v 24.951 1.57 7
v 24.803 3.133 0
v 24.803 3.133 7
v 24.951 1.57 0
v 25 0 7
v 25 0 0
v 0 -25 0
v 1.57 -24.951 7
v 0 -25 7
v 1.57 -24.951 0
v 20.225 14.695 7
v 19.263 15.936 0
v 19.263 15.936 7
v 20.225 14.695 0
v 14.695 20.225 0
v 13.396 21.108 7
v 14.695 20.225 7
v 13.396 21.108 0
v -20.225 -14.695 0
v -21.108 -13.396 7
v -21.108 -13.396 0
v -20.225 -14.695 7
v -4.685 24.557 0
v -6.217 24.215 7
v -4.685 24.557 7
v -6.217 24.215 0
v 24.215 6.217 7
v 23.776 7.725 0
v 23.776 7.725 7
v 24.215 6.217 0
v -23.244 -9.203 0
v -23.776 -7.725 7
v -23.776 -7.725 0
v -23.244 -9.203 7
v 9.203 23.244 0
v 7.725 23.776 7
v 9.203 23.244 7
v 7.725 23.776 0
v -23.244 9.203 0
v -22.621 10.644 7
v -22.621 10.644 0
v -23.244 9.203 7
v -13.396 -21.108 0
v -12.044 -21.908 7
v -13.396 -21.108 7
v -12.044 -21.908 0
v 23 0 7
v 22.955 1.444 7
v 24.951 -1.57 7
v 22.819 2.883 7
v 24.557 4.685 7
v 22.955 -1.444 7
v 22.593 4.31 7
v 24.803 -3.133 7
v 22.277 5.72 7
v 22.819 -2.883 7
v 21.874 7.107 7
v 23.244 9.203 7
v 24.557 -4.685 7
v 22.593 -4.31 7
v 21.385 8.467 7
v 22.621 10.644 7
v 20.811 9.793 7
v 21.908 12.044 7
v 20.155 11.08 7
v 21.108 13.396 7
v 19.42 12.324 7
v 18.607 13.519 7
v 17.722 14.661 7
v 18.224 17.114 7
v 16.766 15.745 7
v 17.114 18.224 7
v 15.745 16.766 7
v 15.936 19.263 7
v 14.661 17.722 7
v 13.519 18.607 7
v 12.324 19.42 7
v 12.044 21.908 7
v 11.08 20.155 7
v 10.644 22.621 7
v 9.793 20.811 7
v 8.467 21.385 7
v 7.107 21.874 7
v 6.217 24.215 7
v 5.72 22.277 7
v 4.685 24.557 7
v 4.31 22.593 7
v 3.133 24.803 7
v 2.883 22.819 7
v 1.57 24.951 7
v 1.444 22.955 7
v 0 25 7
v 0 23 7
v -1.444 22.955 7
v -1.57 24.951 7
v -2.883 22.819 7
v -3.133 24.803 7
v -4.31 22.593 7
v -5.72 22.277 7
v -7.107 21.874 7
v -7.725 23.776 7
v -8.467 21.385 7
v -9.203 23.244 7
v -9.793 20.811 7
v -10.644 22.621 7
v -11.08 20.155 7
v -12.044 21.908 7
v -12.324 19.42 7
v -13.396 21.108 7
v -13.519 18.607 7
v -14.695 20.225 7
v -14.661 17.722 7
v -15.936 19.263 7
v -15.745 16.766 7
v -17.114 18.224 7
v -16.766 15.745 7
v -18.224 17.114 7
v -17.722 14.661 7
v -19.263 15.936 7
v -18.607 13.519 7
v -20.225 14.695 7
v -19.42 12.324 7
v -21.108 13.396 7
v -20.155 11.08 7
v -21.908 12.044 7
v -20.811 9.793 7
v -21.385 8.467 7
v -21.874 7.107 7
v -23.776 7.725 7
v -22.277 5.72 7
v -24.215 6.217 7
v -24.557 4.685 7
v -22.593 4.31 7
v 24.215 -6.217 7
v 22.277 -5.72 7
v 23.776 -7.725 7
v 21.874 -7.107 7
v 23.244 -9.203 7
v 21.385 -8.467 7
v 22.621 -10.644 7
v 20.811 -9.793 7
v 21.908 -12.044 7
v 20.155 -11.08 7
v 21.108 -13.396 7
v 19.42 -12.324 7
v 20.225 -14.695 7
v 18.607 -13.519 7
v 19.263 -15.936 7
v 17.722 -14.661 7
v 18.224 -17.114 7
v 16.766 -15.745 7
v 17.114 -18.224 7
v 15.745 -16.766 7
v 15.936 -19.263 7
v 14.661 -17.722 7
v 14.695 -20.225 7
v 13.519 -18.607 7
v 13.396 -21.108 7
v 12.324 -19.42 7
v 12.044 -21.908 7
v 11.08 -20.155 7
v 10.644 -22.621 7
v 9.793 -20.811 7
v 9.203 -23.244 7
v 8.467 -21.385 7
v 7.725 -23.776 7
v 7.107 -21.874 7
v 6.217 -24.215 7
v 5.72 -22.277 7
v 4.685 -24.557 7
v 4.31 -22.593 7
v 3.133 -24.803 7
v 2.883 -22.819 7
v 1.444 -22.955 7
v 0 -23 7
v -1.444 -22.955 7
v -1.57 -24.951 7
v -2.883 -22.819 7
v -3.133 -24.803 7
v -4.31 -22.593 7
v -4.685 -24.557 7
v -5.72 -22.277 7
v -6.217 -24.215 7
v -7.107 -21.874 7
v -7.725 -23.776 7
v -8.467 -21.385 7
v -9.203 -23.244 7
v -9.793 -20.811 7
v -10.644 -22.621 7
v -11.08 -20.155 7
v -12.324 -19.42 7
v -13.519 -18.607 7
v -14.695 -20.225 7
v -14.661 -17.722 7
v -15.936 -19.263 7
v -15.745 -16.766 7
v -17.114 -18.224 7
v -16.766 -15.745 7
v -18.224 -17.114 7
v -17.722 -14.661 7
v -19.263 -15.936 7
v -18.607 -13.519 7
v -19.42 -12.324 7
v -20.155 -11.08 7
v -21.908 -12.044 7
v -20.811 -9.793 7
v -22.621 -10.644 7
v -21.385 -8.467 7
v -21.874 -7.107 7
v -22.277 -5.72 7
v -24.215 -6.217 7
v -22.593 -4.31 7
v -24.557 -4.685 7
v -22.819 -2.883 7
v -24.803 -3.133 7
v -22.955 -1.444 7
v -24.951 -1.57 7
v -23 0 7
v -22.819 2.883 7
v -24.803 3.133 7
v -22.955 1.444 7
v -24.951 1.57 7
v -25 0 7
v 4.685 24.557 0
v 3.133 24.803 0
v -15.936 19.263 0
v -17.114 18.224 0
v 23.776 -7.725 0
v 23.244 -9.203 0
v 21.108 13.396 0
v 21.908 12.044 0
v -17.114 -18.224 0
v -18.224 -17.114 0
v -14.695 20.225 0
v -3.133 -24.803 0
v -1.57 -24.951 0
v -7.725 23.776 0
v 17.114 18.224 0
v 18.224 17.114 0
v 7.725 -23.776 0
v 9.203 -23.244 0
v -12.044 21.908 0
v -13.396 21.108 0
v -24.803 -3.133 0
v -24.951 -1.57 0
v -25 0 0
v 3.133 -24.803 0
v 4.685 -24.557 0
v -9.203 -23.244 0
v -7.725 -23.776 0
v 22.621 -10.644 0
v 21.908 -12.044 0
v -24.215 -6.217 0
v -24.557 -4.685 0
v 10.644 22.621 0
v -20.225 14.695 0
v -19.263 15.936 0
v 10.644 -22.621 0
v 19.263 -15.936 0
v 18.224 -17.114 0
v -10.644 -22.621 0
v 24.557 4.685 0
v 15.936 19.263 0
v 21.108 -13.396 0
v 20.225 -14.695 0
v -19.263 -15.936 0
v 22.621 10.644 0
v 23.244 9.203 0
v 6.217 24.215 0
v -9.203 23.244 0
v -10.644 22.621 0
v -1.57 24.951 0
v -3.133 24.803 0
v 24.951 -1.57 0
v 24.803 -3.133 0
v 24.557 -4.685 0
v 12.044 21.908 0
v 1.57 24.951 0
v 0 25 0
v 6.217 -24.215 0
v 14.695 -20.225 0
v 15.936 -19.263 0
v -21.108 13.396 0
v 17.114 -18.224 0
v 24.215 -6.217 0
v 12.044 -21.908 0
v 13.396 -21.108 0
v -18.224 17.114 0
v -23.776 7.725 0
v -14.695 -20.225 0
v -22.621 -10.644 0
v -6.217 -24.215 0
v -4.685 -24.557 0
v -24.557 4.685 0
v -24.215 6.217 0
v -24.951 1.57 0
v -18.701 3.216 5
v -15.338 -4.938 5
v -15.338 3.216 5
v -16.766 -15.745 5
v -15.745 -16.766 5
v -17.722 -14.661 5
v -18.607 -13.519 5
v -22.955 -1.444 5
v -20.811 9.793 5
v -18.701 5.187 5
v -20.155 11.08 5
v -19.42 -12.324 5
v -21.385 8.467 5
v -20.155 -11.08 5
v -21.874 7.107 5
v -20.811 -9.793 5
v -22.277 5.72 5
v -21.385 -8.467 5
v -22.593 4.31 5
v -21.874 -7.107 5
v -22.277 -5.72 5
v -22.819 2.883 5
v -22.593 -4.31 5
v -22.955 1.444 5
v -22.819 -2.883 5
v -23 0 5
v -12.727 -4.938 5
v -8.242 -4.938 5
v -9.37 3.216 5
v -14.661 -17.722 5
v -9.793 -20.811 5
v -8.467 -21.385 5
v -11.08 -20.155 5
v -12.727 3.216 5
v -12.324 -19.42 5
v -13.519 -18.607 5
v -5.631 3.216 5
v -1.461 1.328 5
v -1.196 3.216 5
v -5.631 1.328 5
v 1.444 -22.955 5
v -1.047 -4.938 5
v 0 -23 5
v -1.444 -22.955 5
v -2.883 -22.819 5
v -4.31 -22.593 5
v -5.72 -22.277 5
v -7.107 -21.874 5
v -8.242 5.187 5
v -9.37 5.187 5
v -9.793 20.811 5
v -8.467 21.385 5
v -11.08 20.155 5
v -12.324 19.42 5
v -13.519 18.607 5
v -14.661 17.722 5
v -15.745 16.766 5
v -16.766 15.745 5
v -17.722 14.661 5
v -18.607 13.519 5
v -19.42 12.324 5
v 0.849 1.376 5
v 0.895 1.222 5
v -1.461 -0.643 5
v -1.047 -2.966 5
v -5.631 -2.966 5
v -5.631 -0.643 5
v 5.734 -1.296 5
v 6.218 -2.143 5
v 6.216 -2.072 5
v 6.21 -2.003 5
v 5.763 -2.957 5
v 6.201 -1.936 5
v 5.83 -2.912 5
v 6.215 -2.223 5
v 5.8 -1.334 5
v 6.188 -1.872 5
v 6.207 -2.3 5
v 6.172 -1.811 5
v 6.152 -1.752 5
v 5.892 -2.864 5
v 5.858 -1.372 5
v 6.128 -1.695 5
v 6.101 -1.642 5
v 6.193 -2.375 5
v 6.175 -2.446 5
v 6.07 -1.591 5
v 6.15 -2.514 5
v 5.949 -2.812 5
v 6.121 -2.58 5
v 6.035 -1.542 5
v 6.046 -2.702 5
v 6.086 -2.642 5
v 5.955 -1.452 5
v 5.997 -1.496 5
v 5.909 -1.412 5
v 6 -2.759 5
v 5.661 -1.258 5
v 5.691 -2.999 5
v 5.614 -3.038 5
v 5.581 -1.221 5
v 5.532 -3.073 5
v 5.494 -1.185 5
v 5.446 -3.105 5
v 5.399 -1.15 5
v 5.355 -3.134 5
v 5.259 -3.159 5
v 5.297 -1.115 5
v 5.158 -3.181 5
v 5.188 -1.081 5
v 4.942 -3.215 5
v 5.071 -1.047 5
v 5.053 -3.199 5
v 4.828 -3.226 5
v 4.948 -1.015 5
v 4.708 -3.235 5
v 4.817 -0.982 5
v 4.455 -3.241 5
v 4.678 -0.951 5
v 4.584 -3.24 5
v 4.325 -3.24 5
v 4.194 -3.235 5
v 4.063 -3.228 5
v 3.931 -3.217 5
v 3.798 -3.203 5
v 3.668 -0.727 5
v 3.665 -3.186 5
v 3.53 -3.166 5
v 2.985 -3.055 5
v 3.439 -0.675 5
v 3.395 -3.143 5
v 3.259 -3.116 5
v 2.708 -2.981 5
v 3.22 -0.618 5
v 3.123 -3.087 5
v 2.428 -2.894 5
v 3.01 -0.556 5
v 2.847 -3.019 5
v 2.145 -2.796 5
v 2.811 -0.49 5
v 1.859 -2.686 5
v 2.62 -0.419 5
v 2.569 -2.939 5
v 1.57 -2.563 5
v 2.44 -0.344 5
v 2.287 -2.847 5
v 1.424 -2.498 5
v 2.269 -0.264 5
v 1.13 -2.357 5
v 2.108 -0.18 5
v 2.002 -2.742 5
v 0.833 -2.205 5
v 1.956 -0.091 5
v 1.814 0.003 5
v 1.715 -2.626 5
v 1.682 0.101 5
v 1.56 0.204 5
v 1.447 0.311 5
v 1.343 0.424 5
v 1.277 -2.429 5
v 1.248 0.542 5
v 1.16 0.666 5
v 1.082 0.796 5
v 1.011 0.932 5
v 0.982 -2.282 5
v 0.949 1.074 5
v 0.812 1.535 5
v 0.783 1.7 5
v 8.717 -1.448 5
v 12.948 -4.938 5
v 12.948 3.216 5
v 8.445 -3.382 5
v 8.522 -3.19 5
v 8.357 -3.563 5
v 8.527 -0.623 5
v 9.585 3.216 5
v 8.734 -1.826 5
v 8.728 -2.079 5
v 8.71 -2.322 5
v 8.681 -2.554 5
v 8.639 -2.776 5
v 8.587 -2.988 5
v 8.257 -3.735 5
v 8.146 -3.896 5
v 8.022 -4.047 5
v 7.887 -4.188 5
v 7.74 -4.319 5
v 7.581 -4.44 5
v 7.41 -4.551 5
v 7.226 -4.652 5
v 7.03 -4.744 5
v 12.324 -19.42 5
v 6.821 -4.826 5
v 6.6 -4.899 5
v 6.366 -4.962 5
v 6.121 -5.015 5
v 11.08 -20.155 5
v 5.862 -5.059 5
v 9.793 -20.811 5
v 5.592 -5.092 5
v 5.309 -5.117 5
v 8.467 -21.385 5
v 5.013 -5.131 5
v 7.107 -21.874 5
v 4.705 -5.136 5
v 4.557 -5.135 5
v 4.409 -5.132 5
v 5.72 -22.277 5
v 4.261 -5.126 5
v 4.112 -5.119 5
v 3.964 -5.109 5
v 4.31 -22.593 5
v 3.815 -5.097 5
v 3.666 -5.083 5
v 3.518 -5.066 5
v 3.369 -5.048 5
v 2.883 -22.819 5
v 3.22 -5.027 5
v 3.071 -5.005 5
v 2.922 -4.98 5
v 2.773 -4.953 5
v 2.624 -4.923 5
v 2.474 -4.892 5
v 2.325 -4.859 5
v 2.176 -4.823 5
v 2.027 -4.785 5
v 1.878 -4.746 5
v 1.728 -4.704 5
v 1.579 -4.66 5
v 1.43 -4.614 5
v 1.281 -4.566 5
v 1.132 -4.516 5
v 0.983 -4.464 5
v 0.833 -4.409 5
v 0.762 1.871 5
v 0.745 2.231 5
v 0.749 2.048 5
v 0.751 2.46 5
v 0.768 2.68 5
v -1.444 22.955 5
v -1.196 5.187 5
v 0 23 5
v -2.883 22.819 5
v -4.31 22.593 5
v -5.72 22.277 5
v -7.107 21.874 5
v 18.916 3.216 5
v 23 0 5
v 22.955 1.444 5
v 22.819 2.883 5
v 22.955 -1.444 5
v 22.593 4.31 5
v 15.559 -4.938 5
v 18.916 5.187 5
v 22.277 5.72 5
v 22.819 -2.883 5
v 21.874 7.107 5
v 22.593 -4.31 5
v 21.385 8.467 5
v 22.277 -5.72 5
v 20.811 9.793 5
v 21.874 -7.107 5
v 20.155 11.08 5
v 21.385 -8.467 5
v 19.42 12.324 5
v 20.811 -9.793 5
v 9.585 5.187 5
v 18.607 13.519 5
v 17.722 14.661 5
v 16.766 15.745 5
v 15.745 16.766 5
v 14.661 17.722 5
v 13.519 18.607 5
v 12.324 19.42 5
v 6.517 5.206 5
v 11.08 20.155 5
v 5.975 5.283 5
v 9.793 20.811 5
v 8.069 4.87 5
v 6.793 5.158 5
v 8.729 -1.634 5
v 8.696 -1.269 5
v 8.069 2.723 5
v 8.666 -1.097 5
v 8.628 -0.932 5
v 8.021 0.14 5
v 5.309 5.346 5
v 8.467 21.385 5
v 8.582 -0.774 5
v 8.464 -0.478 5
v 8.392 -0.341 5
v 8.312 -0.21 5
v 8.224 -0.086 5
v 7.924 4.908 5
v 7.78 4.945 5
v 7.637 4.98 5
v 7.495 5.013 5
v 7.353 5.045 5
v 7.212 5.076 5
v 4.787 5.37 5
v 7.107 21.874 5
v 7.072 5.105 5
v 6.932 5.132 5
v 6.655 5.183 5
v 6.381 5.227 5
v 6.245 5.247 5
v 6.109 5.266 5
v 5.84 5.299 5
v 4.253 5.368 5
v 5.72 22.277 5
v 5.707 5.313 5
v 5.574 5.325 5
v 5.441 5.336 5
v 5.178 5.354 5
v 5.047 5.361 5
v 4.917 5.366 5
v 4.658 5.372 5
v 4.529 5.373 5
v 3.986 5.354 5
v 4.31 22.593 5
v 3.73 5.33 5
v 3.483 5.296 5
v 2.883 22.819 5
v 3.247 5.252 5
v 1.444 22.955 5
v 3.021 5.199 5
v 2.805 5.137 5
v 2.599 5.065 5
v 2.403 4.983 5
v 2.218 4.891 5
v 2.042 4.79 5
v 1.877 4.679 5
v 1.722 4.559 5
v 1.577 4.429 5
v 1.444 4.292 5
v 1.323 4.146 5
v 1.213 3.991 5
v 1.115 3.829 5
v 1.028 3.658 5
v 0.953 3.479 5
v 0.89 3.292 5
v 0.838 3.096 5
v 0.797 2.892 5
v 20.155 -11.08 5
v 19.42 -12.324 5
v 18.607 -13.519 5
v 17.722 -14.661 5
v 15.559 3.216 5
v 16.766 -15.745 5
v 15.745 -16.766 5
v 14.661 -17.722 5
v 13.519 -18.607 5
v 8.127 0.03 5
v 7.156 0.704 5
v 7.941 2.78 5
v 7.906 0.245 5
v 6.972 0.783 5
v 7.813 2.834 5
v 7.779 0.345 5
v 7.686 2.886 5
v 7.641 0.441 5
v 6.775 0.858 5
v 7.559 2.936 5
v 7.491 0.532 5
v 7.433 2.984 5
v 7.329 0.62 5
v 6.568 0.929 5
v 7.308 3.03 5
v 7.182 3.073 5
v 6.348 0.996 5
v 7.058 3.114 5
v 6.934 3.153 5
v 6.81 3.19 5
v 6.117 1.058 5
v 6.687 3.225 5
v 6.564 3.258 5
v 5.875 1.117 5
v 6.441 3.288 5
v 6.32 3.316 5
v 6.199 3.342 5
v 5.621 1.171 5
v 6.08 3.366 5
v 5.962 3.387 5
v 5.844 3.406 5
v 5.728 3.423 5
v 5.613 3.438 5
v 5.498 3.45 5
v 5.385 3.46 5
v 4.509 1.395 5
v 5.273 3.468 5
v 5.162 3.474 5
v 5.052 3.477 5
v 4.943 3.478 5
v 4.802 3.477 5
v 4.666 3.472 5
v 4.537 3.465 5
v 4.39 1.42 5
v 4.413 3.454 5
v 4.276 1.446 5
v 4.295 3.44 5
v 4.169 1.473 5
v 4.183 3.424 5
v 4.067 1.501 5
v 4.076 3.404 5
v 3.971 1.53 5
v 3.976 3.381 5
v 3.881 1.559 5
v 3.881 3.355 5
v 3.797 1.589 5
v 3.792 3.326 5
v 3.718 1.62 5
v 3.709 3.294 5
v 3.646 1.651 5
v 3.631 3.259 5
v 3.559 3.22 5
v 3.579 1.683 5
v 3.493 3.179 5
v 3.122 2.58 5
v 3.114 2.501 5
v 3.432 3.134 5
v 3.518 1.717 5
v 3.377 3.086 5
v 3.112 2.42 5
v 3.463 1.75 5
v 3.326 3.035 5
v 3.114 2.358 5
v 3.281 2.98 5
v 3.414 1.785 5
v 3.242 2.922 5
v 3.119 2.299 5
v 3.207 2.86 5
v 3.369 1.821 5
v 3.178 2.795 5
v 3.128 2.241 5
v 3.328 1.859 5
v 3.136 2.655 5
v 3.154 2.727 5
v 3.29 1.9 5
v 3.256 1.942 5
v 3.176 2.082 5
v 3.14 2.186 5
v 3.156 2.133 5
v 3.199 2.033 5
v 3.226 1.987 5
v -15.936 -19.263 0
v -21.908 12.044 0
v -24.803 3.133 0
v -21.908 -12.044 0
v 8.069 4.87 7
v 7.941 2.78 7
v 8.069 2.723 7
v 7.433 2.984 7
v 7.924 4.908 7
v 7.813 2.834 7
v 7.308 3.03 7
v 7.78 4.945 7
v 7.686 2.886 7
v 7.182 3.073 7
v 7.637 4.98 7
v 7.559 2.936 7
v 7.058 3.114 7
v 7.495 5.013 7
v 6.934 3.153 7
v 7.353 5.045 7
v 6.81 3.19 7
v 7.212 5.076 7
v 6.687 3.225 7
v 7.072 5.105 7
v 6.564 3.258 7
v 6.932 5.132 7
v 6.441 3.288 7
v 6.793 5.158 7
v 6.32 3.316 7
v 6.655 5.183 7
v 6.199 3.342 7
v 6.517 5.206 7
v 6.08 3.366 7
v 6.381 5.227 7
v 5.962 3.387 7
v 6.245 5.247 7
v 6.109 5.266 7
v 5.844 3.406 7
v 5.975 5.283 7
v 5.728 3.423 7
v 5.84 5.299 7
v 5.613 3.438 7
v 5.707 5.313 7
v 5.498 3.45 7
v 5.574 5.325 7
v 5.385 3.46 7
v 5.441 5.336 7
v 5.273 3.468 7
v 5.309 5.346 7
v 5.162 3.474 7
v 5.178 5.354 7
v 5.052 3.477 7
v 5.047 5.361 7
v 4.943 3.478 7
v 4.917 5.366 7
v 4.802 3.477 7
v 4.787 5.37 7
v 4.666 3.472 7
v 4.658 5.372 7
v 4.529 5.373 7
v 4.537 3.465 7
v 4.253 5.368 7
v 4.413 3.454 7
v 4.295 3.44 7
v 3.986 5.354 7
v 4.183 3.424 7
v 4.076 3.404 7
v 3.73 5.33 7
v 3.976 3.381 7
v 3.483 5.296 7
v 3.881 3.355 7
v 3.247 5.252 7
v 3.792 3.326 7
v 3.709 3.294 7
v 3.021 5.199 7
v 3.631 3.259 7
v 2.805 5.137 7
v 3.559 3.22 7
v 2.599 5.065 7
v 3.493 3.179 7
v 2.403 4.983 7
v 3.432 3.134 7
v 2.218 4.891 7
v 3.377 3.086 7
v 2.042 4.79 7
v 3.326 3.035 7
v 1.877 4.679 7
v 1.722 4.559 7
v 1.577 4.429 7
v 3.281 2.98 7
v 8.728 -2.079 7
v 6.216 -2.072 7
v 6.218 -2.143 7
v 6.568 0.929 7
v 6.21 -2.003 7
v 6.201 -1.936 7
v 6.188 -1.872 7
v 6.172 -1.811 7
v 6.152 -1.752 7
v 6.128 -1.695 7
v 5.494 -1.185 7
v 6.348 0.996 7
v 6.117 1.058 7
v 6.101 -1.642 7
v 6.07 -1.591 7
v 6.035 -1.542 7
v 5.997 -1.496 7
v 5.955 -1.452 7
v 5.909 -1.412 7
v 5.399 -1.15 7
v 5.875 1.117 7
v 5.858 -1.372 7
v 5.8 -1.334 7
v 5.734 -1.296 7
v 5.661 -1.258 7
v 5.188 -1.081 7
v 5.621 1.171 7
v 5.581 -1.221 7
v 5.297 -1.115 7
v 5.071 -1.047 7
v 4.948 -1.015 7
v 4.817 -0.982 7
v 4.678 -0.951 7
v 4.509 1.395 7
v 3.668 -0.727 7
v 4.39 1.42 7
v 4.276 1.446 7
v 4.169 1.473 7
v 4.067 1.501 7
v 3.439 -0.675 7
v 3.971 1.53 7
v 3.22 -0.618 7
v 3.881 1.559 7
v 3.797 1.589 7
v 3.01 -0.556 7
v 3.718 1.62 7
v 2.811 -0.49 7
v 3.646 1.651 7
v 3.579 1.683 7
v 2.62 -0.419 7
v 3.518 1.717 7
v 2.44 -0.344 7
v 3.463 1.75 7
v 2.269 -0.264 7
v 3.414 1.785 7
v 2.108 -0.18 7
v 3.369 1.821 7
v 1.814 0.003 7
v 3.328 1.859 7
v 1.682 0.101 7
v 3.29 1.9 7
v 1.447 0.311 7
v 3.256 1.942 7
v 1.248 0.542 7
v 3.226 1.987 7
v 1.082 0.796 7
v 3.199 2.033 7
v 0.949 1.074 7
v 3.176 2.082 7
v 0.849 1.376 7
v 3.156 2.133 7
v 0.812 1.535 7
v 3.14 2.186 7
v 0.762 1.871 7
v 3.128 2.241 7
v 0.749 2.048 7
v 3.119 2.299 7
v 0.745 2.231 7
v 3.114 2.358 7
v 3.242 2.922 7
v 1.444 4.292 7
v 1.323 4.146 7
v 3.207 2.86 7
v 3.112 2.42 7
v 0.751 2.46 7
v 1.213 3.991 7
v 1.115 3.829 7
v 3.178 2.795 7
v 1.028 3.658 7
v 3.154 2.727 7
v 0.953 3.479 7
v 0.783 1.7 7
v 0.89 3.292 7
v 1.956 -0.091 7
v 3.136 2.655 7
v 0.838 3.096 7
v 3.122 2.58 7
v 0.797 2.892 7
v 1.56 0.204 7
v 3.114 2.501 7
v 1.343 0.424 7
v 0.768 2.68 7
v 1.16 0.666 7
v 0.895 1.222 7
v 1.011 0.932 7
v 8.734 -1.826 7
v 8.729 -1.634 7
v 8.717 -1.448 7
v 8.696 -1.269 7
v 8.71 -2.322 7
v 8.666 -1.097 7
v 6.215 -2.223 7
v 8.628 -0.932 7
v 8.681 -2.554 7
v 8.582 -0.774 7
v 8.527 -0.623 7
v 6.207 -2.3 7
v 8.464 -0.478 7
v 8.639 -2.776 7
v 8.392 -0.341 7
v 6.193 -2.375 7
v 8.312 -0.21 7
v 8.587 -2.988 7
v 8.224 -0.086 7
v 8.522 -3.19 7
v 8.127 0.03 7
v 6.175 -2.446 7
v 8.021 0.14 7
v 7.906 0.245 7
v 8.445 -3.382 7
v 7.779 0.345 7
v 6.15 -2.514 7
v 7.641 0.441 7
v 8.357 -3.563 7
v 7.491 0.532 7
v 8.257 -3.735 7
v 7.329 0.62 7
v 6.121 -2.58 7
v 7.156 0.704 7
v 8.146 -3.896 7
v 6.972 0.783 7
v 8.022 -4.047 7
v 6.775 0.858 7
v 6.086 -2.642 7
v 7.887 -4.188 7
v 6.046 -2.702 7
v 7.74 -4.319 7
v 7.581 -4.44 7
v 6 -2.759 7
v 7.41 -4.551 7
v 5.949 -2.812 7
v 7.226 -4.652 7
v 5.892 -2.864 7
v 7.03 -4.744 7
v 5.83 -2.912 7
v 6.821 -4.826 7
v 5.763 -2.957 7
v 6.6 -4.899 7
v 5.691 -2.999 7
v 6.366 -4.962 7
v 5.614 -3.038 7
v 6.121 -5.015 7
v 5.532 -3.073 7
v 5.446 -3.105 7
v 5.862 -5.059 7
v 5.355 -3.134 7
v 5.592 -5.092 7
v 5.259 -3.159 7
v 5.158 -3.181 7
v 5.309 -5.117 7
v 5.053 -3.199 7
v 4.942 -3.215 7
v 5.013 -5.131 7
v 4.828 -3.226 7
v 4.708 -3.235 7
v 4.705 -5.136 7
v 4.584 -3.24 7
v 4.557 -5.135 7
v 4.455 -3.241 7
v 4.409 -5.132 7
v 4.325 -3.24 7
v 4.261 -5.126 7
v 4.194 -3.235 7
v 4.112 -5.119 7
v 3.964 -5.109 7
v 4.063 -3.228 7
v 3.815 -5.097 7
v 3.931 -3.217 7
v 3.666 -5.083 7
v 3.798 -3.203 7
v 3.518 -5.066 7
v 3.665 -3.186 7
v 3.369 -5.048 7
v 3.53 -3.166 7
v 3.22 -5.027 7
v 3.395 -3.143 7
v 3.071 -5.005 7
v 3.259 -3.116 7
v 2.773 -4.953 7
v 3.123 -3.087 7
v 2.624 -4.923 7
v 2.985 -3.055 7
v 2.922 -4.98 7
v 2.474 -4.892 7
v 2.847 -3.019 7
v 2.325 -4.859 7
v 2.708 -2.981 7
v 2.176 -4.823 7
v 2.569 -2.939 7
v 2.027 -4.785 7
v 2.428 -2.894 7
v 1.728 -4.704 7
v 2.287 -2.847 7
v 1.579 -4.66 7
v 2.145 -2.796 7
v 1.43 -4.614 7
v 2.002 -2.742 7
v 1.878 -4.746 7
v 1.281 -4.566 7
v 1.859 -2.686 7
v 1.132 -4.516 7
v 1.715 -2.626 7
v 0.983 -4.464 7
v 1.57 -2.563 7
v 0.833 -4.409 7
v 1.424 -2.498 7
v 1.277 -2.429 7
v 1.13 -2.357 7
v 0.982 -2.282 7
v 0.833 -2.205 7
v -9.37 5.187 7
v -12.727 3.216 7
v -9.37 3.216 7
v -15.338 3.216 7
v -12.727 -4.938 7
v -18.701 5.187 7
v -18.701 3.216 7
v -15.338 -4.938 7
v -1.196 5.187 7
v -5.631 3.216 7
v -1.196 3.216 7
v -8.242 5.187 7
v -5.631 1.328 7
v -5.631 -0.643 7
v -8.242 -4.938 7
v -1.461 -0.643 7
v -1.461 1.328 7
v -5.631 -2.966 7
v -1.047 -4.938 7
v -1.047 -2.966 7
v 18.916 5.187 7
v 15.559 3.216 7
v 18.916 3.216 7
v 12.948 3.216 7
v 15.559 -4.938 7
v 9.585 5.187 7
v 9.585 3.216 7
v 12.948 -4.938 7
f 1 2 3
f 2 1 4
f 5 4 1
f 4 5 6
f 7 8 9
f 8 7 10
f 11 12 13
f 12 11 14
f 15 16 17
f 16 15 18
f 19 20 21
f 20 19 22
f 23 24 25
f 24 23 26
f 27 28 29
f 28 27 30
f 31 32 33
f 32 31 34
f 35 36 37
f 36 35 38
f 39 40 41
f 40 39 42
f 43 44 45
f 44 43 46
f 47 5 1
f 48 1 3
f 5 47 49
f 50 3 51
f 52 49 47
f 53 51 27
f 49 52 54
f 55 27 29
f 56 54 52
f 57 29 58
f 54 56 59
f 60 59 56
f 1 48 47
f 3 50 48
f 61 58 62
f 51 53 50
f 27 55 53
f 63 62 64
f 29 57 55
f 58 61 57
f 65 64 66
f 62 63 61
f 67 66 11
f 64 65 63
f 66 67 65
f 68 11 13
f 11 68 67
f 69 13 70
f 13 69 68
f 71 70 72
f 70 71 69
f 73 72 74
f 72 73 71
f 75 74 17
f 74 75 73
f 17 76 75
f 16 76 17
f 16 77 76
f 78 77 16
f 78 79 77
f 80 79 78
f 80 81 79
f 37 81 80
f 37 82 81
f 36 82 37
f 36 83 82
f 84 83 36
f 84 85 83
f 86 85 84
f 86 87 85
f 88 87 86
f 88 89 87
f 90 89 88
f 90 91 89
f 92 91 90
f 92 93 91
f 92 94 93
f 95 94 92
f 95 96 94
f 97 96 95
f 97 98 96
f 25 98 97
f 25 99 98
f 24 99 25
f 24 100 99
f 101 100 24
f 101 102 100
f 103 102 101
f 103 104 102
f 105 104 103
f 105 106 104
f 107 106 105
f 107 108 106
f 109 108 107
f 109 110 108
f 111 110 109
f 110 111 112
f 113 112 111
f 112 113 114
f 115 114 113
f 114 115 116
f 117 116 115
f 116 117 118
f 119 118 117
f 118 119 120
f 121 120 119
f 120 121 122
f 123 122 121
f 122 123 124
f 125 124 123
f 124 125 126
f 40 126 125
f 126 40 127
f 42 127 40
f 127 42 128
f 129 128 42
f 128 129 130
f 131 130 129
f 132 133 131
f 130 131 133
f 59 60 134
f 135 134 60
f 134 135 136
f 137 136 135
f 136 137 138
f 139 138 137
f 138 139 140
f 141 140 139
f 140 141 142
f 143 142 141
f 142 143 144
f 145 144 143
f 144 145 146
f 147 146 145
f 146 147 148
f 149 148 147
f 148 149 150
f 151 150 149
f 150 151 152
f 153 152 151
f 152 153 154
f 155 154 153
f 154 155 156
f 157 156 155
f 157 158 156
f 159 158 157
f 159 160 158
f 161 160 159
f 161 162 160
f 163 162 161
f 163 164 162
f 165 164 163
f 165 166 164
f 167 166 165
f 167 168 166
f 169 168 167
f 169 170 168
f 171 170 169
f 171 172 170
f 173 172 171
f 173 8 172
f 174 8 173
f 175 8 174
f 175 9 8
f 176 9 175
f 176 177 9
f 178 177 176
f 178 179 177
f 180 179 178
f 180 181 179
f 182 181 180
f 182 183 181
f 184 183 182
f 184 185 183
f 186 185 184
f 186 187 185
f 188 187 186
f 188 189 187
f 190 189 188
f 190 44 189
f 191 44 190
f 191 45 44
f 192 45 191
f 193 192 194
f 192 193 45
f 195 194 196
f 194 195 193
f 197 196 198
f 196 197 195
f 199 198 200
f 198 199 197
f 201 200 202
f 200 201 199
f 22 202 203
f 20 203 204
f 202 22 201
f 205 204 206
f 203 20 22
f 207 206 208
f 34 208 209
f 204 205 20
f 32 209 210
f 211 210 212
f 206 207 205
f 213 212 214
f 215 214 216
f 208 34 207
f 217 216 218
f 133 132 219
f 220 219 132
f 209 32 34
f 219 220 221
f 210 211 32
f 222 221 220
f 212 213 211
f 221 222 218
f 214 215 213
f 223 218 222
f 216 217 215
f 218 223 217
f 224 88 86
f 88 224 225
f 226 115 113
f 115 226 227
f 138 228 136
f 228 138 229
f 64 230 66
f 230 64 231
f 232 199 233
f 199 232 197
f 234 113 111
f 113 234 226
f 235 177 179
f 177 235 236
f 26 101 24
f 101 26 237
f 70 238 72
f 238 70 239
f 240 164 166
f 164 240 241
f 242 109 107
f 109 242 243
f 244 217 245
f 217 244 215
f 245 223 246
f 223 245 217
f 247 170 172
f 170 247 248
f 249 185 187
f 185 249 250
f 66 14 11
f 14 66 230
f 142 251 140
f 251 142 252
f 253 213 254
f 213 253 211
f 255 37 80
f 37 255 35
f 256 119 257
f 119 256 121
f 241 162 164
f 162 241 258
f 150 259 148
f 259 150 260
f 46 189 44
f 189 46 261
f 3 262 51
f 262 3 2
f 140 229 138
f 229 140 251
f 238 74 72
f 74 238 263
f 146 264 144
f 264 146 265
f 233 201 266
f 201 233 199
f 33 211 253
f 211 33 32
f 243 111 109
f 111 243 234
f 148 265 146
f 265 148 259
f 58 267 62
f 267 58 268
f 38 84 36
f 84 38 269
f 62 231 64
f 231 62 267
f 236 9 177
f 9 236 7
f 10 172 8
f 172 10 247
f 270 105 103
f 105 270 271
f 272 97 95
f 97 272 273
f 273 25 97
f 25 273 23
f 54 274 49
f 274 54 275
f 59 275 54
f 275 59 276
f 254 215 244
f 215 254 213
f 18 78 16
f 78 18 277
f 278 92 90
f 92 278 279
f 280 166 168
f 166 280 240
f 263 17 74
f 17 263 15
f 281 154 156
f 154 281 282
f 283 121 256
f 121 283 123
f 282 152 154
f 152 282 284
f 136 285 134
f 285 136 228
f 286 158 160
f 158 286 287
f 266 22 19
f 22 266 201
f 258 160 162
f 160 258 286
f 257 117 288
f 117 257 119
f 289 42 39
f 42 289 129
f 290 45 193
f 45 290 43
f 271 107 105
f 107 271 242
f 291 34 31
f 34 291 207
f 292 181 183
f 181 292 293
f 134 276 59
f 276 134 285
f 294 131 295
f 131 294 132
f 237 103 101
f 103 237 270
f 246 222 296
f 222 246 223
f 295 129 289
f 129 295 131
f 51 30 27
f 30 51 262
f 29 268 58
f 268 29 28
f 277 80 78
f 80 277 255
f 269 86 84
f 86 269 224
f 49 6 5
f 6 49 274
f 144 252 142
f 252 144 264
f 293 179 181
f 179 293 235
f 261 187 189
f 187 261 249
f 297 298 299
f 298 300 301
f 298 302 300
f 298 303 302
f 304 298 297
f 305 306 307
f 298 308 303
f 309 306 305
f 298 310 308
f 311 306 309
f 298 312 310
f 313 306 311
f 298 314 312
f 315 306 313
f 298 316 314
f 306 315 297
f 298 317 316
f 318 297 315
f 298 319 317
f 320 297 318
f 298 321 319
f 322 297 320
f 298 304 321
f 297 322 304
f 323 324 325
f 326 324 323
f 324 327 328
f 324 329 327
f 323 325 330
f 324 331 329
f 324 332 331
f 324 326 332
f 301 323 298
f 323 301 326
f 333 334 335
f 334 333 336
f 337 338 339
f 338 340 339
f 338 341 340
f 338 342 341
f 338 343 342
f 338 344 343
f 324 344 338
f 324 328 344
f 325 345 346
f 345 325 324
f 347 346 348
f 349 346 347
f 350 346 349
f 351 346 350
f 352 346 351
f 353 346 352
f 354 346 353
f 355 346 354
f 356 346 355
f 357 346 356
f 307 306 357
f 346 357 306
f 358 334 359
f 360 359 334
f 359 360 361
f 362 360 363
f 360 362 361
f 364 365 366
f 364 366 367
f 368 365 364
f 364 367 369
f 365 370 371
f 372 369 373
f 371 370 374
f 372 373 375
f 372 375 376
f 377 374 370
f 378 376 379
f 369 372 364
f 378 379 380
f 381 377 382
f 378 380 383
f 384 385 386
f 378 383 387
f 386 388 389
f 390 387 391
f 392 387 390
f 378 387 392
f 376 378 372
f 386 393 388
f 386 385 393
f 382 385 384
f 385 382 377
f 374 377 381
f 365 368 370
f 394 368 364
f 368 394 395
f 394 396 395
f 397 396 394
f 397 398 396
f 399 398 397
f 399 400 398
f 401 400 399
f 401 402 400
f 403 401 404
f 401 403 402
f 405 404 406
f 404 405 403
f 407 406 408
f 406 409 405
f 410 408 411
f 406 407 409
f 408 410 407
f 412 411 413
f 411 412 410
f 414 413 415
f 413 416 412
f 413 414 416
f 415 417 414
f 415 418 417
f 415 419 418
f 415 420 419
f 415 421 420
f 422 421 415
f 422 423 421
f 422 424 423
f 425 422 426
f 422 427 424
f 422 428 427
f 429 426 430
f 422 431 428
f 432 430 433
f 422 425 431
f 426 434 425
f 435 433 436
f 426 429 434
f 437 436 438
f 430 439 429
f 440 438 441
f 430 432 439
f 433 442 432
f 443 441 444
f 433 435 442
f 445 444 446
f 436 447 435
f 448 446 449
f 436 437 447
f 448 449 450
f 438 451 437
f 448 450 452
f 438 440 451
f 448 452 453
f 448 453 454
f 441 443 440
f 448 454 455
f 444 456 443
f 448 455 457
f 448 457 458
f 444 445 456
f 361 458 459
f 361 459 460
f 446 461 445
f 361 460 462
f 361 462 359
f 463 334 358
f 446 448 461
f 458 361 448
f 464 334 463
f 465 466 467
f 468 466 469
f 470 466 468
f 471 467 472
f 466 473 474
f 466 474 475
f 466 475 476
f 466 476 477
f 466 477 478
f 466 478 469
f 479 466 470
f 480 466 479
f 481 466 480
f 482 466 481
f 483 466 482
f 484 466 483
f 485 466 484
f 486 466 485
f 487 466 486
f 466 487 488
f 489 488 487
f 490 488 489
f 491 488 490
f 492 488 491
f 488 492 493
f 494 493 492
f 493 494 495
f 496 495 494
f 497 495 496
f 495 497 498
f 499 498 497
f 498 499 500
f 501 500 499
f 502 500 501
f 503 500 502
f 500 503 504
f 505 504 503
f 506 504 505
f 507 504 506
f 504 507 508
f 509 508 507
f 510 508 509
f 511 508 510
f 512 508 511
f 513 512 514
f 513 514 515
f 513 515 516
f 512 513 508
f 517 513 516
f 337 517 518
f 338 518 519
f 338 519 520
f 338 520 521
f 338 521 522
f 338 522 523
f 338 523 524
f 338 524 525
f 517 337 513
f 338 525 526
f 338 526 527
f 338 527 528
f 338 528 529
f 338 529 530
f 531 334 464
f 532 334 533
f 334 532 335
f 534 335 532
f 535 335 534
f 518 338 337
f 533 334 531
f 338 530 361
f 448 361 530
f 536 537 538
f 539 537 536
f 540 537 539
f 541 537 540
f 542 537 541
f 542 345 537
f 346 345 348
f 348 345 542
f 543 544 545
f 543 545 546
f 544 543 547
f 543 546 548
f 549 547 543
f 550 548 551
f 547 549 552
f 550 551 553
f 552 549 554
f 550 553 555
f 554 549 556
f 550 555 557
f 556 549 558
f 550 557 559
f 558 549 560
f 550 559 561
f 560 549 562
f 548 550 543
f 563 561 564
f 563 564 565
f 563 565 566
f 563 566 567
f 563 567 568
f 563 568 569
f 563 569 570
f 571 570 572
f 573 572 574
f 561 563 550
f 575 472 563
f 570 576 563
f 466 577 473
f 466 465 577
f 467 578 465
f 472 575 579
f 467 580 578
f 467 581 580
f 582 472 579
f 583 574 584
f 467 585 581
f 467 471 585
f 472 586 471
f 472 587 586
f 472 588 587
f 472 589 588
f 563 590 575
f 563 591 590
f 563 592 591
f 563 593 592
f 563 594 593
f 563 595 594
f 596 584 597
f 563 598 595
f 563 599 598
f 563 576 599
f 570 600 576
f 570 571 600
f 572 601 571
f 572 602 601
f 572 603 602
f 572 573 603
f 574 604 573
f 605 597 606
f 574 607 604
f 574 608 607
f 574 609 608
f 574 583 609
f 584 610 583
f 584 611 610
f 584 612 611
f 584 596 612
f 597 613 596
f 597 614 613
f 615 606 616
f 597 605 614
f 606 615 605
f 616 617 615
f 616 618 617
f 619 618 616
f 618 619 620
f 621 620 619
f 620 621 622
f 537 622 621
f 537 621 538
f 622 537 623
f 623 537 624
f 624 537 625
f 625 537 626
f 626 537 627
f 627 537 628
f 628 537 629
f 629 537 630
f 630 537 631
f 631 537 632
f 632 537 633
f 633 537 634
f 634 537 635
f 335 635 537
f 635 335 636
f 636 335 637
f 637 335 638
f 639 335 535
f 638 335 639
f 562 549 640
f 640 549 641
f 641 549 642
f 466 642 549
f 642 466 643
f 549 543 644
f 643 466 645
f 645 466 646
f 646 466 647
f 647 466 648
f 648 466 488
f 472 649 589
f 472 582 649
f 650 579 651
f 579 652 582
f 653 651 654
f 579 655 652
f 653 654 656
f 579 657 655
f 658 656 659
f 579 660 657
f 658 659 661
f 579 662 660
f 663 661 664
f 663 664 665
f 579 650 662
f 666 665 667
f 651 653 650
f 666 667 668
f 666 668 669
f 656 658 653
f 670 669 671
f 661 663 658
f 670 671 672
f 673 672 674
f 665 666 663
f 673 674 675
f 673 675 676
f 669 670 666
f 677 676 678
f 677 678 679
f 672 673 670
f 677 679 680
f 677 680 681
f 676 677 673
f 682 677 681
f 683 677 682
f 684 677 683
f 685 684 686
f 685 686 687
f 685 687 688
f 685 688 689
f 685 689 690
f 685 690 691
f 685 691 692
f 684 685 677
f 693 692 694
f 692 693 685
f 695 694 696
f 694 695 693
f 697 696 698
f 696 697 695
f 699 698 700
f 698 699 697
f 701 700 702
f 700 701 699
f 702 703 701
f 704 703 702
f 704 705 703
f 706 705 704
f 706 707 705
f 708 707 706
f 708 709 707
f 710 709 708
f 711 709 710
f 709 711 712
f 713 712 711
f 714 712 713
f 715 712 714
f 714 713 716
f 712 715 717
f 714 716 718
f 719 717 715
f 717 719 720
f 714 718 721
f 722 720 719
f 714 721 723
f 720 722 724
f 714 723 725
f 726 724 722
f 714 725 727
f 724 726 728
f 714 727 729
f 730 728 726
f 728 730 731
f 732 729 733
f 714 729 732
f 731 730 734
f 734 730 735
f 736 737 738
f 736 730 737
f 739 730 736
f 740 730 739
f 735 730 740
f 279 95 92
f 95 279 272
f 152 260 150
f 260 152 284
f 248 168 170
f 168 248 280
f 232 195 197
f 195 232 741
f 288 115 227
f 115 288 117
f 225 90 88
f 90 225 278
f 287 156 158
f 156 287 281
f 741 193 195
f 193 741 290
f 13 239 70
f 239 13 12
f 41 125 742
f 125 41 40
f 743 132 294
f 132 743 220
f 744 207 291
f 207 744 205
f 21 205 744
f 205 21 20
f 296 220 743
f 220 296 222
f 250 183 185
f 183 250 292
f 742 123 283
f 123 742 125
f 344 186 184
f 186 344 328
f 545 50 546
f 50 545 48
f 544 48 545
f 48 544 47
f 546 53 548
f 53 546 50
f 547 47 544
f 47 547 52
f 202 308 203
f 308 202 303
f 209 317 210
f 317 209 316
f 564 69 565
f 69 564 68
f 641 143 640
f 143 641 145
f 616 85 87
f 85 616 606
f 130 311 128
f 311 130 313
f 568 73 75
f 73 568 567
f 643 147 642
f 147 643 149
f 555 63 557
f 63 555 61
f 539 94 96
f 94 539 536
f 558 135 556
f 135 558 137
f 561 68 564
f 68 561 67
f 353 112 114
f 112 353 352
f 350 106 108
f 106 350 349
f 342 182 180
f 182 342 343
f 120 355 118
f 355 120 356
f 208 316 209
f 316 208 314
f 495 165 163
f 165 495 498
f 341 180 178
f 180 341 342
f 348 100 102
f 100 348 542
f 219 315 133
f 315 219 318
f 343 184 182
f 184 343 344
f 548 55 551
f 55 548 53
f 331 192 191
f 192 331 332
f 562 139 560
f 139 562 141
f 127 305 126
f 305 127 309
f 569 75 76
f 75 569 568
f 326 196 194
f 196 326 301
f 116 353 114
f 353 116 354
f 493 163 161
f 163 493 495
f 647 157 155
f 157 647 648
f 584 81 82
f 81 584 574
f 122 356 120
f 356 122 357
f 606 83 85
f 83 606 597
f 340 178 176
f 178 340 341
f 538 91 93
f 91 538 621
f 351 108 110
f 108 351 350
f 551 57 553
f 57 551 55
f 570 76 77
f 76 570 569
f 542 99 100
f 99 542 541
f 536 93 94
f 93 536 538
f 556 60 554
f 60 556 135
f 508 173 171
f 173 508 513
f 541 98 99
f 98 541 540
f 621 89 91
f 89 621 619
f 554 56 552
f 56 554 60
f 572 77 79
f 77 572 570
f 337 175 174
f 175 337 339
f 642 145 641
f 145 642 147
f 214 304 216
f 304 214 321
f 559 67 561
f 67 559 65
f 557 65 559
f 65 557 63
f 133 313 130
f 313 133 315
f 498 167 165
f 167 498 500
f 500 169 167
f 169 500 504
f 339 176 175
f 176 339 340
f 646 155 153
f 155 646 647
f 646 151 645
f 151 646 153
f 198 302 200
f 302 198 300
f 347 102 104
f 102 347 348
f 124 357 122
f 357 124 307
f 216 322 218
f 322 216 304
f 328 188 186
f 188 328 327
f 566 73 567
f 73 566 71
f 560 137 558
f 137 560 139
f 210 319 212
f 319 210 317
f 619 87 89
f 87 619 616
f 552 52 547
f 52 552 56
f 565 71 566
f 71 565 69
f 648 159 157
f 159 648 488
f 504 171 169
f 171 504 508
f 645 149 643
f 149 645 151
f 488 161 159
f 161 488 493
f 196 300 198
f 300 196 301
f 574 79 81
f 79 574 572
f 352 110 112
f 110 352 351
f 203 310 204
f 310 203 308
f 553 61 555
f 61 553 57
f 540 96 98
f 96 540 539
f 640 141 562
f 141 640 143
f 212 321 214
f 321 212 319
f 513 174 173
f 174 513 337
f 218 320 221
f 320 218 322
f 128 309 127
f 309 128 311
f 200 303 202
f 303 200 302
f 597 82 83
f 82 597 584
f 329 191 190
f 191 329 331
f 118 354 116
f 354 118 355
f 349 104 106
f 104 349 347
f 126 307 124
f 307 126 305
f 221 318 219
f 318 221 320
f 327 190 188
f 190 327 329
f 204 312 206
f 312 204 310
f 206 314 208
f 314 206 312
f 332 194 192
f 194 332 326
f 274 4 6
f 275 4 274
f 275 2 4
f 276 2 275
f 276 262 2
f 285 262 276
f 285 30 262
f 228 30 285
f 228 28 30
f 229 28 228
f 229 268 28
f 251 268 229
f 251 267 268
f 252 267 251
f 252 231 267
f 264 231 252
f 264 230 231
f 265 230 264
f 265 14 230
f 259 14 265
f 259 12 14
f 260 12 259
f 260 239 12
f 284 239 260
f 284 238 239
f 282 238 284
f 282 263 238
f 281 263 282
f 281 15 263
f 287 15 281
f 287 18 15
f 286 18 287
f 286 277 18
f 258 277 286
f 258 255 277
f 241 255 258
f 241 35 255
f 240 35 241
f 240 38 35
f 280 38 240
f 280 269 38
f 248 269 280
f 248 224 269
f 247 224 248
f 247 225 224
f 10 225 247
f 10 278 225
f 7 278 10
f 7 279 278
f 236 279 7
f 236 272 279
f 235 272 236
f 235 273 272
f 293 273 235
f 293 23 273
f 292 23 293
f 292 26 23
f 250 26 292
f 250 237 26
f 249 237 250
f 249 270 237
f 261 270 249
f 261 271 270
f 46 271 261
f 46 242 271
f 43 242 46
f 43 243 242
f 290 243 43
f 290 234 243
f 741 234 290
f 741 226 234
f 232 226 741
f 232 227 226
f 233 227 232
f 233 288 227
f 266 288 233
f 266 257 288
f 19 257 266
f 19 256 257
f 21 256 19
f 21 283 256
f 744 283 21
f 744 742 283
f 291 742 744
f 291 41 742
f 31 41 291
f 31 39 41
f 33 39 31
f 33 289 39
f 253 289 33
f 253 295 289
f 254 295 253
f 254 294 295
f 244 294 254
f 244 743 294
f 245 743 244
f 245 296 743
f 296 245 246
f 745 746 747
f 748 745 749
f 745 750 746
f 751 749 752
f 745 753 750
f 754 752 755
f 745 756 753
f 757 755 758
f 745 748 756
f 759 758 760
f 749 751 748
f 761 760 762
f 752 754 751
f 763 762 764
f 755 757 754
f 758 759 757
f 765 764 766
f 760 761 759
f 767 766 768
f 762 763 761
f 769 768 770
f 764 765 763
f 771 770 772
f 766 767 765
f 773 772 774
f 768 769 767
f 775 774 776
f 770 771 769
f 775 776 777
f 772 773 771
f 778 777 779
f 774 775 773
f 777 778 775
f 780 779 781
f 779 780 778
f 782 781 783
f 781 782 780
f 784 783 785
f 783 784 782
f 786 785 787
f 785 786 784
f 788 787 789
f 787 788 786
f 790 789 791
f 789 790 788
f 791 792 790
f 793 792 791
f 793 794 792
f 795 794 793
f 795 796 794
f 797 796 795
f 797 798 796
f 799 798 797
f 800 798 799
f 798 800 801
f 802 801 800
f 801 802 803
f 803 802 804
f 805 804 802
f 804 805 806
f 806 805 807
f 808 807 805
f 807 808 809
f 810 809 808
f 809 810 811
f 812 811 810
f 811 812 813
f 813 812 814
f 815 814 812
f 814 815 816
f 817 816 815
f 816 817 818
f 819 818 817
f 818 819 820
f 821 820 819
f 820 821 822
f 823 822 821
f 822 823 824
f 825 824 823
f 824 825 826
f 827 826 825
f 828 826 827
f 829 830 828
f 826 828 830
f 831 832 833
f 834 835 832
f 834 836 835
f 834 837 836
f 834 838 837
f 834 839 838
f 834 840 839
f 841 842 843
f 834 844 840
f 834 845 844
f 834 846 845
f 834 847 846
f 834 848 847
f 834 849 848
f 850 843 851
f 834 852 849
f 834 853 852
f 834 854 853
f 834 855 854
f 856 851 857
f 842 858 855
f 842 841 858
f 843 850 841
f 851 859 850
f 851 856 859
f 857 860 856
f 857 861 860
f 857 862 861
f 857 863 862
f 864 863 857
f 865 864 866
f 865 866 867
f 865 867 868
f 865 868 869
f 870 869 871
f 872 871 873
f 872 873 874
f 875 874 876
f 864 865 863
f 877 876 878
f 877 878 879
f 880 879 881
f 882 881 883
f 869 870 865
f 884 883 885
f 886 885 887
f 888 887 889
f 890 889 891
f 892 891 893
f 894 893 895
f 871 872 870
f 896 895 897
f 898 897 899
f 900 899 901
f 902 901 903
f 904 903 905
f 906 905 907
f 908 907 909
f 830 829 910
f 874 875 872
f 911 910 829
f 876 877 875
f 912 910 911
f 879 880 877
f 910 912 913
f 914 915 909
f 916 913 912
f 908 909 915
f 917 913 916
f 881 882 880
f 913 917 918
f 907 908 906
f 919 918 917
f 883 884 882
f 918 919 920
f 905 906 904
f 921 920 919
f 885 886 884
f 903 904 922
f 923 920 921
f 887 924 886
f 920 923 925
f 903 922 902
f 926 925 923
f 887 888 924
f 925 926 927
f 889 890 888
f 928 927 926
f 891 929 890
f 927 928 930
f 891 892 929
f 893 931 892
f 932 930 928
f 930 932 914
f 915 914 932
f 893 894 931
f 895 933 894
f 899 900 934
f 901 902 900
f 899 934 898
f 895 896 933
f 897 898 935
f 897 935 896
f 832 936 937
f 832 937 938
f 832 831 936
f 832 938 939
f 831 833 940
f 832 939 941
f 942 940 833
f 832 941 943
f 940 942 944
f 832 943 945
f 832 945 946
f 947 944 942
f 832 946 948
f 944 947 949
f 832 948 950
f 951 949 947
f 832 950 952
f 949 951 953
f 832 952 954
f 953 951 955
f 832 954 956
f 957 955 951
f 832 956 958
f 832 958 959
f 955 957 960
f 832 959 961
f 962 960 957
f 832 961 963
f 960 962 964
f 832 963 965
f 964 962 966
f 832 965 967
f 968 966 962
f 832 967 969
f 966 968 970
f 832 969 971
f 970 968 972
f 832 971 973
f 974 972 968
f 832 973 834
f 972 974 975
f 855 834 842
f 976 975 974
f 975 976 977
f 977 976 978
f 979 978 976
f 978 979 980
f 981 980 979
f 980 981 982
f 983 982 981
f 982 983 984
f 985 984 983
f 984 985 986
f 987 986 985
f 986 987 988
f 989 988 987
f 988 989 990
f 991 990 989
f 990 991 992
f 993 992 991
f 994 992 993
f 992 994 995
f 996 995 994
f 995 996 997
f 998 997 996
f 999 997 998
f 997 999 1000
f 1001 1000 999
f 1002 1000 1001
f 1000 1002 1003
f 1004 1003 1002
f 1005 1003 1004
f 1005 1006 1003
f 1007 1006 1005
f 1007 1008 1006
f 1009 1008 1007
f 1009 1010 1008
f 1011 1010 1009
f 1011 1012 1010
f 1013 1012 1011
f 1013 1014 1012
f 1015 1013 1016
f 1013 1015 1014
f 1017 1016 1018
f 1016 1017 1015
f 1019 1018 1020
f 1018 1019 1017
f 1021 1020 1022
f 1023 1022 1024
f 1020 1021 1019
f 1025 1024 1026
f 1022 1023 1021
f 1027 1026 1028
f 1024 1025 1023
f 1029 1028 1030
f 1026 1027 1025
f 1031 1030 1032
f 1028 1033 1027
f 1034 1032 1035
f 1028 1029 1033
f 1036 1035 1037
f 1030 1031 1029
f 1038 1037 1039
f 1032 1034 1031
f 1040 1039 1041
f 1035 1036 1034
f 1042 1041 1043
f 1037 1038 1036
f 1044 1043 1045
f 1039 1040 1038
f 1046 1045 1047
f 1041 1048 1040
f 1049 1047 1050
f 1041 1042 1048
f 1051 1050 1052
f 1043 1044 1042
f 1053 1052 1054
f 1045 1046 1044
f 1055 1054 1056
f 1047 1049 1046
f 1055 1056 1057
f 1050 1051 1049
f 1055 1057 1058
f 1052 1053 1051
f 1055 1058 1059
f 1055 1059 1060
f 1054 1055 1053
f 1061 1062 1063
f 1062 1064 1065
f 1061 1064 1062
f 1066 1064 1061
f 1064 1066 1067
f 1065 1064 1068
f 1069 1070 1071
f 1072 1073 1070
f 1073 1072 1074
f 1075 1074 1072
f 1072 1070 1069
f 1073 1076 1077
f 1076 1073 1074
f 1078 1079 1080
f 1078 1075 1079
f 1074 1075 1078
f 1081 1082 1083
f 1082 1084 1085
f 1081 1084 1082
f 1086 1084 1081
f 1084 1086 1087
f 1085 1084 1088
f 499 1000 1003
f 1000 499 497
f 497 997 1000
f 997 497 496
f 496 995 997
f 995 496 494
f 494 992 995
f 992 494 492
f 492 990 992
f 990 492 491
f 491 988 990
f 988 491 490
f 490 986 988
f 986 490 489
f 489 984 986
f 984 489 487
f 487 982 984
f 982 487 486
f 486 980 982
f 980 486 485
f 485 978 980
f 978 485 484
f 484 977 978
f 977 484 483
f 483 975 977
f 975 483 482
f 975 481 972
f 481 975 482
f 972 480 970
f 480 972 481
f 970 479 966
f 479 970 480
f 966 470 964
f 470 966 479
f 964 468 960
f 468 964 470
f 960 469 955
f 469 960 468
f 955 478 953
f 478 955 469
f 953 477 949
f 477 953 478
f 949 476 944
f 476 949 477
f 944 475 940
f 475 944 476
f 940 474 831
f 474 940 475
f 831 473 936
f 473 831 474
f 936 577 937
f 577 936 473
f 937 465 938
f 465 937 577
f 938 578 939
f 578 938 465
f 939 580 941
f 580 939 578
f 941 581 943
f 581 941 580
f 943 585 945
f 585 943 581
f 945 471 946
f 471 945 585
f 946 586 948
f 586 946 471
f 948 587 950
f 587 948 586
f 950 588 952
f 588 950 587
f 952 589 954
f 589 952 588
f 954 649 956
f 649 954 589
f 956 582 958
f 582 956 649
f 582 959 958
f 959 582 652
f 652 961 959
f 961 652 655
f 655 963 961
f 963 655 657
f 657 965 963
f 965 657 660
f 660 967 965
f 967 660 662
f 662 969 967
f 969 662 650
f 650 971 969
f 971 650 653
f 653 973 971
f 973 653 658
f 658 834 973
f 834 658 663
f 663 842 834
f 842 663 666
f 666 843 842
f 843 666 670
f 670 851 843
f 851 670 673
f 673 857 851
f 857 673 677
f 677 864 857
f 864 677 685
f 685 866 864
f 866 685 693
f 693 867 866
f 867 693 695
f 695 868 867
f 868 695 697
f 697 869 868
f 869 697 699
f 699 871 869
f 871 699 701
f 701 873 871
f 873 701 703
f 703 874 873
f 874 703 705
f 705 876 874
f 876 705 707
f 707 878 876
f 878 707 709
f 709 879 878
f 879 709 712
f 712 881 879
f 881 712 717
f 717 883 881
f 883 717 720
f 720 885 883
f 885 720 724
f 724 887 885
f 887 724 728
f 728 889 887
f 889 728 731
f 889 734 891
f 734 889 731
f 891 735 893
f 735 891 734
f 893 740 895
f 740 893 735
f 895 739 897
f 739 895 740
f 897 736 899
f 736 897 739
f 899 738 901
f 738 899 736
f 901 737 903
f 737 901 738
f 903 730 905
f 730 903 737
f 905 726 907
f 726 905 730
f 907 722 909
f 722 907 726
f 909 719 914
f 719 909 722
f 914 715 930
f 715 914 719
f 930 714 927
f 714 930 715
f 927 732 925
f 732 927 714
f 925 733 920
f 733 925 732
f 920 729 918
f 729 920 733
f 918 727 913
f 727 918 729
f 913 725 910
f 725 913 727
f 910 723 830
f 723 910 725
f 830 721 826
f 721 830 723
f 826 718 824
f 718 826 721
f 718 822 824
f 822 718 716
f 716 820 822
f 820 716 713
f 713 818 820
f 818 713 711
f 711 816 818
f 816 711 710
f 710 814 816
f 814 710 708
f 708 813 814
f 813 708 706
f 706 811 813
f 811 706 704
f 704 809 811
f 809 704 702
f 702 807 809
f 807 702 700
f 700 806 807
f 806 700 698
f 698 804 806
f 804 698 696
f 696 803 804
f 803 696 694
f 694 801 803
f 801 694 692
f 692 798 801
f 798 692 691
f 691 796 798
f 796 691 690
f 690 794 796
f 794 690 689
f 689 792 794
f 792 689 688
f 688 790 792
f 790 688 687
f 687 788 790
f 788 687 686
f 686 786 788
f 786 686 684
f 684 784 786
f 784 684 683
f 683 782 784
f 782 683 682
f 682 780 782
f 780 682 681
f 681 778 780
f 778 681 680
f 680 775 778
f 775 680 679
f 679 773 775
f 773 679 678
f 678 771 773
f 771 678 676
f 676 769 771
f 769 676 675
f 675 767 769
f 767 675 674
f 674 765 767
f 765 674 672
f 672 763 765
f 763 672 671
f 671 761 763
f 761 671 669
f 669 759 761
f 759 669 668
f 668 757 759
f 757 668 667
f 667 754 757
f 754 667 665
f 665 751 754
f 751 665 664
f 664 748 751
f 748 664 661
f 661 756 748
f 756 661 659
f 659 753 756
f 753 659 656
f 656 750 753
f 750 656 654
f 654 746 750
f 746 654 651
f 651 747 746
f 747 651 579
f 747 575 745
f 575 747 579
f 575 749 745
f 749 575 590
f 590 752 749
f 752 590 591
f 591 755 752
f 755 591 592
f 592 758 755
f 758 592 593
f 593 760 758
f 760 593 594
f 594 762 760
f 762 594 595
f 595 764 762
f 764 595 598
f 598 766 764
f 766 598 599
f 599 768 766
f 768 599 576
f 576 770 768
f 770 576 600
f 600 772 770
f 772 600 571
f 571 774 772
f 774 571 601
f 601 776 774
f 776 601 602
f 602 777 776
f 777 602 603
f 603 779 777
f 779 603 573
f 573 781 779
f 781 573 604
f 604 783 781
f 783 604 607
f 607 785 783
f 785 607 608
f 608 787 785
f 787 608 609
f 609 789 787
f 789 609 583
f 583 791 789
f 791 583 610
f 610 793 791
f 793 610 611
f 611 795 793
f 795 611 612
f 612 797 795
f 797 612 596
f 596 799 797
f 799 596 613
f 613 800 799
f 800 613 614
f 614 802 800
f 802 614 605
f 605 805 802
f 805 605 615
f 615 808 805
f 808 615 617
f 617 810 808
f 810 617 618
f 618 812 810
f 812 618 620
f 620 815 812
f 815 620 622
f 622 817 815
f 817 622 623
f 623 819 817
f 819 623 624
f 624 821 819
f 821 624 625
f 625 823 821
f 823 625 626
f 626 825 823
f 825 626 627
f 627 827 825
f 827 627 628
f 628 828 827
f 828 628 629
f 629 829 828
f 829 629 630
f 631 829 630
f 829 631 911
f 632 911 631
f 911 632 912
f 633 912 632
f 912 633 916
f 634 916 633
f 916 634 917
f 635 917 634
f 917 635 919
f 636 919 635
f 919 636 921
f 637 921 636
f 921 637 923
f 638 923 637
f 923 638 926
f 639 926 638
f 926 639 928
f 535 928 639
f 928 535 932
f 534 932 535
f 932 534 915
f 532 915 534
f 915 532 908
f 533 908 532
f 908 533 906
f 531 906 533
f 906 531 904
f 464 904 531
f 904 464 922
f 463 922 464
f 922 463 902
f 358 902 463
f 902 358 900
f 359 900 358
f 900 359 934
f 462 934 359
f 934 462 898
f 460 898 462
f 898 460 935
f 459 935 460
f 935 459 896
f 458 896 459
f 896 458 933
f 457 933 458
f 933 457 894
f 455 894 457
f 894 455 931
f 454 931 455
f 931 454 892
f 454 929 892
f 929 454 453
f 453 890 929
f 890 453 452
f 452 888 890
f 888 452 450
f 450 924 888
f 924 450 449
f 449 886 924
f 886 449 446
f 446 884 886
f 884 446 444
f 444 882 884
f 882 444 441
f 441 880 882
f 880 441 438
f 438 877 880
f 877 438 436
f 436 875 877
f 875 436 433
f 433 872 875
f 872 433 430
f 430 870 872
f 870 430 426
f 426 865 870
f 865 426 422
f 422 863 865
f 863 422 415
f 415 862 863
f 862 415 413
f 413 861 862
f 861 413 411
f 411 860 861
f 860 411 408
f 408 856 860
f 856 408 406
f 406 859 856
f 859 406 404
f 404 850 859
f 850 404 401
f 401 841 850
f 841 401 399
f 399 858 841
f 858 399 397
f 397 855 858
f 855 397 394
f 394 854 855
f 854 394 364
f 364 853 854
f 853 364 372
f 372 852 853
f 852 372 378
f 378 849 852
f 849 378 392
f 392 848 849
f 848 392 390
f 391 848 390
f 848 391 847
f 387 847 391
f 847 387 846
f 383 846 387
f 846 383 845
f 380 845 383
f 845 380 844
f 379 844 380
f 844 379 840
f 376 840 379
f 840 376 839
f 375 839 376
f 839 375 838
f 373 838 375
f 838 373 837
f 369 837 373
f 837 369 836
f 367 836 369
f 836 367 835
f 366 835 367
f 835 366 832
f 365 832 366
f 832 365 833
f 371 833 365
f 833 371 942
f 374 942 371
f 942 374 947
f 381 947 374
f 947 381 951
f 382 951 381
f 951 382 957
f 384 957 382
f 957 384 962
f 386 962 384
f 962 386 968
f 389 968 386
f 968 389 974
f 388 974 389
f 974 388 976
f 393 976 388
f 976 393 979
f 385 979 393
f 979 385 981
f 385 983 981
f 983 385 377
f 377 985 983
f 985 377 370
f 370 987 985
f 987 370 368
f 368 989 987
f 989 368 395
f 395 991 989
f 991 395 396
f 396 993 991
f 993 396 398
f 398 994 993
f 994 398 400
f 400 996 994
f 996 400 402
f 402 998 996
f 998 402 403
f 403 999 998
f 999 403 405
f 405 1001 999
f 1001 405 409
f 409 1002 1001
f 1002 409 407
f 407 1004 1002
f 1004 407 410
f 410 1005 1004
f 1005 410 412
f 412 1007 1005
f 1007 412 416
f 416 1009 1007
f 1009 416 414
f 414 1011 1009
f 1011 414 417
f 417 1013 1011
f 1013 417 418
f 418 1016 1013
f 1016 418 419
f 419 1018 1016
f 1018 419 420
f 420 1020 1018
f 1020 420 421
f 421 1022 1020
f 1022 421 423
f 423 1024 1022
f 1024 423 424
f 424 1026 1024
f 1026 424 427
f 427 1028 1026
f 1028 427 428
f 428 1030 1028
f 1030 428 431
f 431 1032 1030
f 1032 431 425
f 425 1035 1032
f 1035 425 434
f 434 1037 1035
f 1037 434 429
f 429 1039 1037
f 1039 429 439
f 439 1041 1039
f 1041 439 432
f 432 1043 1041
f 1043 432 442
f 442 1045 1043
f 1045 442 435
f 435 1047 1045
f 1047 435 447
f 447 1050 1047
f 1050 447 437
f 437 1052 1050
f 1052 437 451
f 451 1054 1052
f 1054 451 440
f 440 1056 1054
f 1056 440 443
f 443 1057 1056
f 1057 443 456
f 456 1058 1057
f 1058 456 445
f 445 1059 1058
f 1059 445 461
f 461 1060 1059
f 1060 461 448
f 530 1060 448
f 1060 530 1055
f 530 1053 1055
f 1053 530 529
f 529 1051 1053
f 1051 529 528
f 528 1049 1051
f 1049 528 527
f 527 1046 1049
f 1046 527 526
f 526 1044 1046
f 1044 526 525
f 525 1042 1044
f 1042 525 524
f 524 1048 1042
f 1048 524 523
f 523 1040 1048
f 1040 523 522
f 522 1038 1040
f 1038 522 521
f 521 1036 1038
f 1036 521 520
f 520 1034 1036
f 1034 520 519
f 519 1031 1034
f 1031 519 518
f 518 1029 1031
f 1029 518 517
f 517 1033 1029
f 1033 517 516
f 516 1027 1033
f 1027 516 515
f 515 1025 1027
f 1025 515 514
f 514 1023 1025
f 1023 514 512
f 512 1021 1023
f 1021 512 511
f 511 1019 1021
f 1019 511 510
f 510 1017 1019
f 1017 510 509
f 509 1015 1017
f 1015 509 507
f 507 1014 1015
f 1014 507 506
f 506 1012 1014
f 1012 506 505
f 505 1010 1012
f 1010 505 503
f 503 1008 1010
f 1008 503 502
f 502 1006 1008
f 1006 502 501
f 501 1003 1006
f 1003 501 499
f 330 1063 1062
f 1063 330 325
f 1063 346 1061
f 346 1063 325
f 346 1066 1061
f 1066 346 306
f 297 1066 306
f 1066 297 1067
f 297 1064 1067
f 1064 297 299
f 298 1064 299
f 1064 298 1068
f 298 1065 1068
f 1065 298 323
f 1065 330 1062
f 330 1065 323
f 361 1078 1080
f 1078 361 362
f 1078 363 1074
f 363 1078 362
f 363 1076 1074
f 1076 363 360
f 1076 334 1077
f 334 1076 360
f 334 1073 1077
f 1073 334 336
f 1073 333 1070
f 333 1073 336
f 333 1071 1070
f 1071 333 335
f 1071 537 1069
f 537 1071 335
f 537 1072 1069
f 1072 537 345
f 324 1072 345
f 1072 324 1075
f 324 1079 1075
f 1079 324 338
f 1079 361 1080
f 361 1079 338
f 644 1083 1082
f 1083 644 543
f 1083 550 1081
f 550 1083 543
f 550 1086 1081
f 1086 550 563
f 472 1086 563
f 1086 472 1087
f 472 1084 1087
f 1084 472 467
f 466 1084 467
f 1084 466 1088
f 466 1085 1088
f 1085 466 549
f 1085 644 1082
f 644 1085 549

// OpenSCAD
$fn = 100;
radius = 25;
structureHeight = 5;
detailHeight = 2;

module structure()
{
    cylinder
    (
        structureHeight,
        radius,
        radius,
        center = false
    );
}

module coin()
{
    structure();

    rimThickness = 2;
    difference()
    {
        translate
        (
            [
                0,
                0,
                structureHeight
            ]
        )
        {
            cylinder
            (
                detailHeight,
                radius,
                radius,
                center = false
            );
        }

        translate
        (
            [
                0,
                0,
                structureHeight
            ]
        )
        {
            cylinder
            (
                detailHeight + 1,
                radius - rimThickness,
                radius - rimThickness,
                center = false
            );
        }
    }
}

module 3dtext(string)
{
    translate
    (
        [
            0,
            0,
            structureHeight
        ]
    )
    {
        linear_extrude(detailHeight)
        {
            text(
                string,
                font="Liberation:style=Bold",
                valign = "center",
                halign = "center"
            );
        }
    }
}

module main()
{
    rotate(a=[0,0,0])
    {
        coin();
        3dtext("TEST");
    }
}

main();
